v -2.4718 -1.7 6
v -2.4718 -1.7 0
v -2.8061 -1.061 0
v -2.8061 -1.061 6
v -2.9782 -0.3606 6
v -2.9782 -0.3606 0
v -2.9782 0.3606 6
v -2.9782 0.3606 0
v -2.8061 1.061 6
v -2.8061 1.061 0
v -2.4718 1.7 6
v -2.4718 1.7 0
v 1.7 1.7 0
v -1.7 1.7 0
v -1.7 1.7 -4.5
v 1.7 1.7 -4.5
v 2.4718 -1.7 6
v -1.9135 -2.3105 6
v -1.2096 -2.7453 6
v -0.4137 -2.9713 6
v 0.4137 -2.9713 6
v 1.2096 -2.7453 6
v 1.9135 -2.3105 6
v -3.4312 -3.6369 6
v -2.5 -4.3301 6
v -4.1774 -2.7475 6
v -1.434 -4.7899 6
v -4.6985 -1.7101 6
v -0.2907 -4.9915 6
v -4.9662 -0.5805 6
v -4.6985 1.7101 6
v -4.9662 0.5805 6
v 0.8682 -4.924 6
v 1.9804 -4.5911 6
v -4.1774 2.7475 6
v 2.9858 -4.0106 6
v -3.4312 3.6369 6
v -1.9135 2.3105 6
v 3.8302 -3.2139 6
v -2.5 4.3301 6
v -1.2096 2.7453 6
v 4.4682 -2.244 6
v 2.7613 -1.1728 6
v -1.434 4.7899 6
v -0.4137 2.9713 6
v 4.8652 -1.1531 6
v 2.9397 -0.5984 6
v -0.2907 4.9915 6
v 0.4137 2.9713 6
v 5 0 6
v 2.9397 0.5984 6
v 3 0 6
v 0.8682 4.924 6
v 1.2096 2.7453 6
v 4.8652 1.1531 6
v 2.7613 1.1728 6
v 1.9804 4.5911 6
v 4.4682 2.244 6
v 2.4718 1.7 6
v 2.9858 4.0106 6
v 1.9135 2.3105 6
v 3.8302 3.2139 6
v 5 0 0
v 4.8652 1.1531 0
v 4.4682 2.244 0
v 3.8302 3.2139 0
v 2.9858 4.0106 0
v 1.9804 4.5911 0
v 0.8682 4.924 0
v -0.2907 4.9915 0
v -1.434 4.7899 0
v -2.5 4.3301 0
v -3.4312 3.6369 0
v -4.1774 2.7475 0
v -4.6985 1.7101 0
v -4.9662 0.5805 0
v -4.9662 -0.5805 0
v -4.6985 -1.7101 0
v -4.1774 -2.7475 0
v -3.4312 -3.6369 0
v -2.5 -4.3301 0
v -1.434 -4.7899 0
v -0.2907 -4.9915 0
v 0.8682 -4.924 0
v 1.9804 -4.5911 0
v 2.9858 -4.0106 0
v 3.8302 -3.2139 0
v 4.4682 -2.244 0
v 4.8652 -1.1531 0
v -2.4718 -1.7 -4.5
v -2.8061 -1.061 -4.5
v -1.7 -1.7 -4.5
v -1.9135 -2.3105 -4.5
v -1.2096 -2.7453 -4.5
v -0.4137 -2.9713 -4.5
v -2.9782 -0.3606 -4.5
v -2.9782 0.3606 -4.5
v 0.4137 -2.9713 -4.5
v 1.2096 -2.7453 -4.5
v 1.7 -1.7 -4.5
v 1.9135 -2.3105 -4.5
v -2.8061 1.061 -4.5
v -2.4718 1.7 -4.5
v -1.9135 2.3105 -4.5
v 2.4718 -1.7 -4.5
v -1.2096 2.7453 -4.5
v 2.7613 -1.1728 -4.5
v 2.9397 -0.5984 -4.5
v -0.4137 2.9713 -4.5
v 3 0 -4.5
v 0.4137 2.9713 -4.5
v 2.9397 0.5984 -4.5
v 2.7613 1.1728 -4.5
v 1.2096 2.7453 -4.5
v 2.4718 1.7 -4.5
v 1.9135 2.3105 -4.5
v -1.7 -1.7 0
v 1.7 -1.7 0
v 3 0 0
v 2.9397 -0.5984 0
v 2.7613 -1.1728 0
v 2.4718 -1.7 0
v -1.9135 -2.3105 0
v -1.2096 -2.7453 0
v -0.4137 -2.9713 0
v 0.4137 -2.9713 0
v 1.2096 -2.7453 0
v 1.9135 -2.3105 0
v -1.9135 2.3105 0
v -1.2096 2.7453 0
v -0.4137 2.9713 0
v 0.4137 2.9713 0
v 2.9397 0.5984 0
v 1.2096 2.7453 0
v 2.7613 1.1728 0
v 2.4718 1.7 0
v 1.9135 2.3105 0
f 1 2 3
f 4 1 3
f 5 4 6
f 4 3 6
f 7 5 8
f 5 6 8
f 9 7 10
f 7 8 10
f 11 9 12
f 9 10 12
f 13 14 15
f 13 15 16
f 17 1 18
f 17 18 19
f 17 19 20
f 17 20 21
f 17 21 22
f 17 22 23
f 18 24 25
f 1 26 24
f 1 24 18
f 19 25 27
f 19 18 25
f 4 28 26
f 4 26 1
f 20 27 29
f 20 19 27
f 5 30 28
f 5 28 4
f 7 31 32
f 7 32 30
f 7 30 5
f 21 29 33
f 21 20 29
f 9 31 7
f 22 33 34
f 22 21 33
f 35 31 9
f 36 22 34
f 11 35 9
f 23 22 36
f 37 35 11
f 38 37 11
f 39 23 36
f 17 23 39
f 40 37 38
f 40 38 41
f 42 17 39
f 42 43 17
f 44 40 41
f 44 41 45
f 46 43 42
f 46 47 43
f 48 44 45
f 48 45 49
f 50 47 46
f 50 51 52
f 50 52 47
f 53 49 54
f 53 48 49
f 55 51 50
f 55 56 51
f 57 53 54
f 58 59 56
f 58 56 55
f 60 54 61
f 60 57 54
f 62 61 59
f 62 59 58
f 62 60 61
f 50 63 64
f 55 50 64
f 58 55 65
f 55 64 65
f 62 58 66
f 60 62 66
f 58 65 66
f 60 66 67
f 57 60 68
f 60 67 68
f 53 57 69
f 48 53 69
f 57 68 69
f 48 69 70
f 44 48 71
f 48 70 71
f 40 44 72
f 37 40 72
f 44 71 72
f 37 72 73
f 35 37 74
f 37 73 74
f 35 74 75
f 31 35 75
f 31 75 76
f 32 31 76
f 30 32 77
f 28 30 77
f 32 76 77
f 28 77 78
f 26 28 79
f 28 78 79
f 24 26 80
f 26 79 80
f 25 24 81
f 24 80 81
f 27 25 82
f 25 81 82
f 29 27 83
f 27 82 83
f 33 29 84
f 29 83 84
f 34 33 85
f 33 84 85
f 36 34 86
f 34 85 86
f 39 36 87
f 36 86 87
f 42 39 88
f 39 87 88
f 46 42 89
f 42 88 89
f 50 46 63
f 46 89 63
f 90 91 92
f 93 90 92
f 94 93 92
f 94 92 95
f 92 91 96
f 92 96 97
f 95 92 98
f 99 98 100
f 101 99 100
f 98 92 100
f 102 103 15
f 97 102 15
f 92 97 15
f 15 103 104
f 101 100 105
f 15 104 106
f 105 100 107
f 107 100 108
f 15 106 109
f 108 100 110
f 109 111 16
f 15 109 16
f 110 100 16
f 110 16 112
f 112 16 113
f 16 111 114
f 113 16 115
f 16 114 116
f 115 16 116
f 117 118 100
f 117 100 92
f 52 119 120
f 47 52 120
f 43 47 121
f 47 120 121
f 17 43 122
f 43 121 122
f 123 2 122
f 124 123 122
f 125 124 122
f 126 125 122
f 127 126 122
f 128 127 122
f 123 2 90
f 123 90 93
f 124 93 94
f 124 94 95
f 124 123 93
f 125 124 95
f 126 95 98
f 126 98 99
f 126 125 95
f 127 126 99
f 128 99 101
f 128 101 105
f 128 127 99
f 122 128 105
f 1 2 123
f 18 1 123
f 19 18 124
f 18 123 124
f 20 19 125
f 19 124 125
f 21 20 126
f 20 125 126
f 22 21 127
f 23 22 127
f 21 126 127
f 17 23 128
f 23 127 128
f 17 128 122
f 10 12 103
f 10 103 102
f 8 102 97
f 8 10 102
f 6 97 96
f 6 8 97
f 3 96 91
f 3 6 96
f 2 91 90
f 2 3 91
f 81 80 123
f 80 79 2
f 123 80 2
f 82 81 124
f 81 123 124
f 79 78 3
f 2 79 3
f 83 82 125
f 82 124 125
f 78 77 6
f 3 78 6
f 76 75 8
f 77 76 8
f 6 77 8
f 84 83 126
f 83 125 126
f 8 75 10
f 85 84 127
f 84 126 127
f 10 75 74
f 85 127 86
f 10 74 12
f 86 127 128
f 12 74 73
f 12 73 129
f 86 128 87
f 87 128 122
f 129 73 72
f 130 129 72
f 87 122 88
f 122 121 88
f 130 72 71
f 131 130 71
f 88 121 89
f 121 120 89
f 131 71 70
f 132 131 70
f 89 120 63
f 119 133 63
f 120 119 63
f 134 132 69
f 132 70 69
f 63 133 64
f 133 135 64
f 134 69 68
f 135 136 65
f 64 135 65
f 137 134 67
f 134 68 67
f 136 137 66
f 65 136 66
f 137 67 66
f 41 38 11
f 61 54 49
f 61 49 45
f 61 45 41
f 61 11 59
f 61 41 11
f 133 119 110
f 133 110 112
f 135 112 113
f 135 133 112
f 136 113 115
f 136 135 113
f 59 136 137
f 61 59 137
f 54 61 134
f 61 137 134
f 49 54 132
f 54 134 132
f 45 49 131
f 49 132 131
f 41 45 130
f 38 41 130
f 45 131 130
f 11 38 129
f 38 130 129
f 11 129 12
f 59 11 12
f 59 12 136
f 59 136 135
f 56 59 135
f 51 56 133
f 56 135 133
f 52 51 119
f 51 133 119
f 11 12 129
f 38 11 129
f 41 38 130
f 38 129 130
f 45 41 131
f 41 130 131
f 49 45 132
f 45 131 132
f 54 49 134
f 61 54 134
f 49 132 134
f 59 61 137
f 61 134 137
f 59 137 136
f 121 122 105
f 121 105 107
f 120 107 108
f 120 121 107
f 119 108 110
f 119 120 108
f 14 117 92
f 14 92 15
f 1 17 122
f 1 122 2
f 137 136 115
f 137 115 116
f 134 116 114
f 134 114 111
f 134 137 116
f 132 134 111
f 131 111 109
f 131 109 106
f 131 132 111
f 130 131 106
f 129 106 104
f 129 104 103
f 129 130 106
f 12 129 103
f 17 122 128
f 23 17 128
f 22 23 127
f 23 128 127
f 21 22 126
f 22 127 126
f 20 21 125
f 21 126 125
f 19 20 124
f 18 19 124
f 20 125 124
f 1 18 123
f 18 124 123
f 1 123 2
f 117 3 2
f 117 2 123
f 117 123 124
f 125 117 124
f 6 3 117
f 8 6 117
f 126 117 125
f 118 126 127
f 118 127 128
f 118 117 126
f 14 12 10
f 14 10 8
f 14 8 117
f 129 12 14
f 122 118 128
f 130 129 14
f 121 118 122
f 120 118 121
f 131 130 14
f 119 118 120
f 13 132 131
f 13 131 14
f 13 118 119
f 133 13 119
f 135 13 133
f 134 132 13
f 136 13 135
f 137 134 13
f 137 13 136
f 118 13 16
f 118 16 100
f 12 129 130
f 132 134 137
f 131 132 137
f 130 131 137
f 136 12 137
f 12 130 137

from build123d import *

# Parameters (mm, degrees)
F1_DEPTH = 4.5
F0_R     = 5
F2_DEPTH = 6
F3_DEPTH = 6
F4_DEPTH = 6


with BuildPart() as f1:
    # F0 (on Top) → F1 (new body)
    with BuildSketch(Plane.XY):
        with BuildLine():
            Line((1.7, 1.7), (2.4718414189, 1.7))
            ThreePointArc((2.4718414189, 1.7), (0, 3), (-2.4718414189, 1.7))
            Line((-2.4718414189, 1.7), (-1.7, 1.7))
            Line((-1.7, 1.7), (1.7, 1.7))
        make_face()
        with BuildLine():
            Line((-1.7, 1.7), (-2.4718414189, 1.7))
            ThreePointArc((-2.4718414189, 1.7), (-3, 0), (-2.4718414189, -1.7))
            Line((-2.4718414189, -1.7), (-1.7, -1.7))
            Line((-1.7, -1.7), (-1.7, 1.7))
        make_face()
        with BuildLine():
            ThreePointArc((-2.4718414189, -1.7), (0, -3), (2.4718414189, -1.7))
            Line((2.4718414189, -1.7), (1.7, -1.7))
            Line((1.7, -1.7), (-1.7, -1.7))
            Line((-1.7, -1.7), (-2.4718414189, -1.7))
        make_face()
        with BuildLine():
            ThreePointArc((2.4718414189, -1.7), (2.8649192185, -0.8900774526), (3, 0))
            ThreePointArc((3, 0), (2.8649192185, 0.8900774526), (2.4718414189, 1.7))
            Line((2.4718414189, 1.7), (1.7, 1.7))
            Line((1.7, 1.7), (1.7, -1.7))
            Line((1.7, -1.7), (2.4718414189, -1.7))
        make_face()
    extrude(amount=-F1_DEPTH)


with BuildPart() as f2:
    # F0 (on Top) → F2 (new body)
    with BuildSketch(Plane.XY):
        Circle(F0_R)
        with BuildLine():
            ThreePointArc((2.4718414189, 1.7), (2.8649192185, 0.8900774526), (3, 0))
            ThreePointArc((3, 0), (2.8649192185, -0.8900774526), (2.4718414189, -1.7))
            ThreePointArc((2.4718414189, -1.7), (0, -3), (-2.4718414189, -1.7))
            ThreePointArc((-2.4718414189, -1.7), (-3, 0), (-2.4718414189, 1.7))
            ThreePointArc((-2.4718414189, 1.7), (0, 3), (2.4718414189, 1.7))
        make_face(mode=Mode.SUBTRACT)
    extrude(amount=F2_DEPTH)


with BuildPart() as f3:
    # F0 (on Top) → F3 (new body)
    with BuildSketch(Plane.XY):
        with BuildLine():
            Line((1.7, 1.7), (2.4718414189, 1.7))
            ThreePointArc((2.4718414189, 1.7), (0, 3), (-2.4718414189, 1.7))
            Line((-2.4718414189, 1.7), (-1.7, 1.7))
            Line((-1.7, 1.7), (1.7, 1.7))
        make_face()
    extrude(amount=F3_DEPTH)


with BuildPart() as f4:
    # F0 (on Top) → F4 (new body)
    with BuildSketch(Plane.XY):
        with BuildLine():
            ThreePointArc((-2.4718414189, -1.7), (0, -3), (2.4718414189, -1.7))
            Line((2.4718414189, -1.7), (1.7, -1.7))
            Line((1.7, -1.7), (-1.7, -1.7))
            Line((-1.7, -1.7), (-2.4718414189, -1.7))
        make_face()
    extrude(amount=F4_DEPTH)


solid = Compound([f1.part, f2.part, f3.part, f4.part])
